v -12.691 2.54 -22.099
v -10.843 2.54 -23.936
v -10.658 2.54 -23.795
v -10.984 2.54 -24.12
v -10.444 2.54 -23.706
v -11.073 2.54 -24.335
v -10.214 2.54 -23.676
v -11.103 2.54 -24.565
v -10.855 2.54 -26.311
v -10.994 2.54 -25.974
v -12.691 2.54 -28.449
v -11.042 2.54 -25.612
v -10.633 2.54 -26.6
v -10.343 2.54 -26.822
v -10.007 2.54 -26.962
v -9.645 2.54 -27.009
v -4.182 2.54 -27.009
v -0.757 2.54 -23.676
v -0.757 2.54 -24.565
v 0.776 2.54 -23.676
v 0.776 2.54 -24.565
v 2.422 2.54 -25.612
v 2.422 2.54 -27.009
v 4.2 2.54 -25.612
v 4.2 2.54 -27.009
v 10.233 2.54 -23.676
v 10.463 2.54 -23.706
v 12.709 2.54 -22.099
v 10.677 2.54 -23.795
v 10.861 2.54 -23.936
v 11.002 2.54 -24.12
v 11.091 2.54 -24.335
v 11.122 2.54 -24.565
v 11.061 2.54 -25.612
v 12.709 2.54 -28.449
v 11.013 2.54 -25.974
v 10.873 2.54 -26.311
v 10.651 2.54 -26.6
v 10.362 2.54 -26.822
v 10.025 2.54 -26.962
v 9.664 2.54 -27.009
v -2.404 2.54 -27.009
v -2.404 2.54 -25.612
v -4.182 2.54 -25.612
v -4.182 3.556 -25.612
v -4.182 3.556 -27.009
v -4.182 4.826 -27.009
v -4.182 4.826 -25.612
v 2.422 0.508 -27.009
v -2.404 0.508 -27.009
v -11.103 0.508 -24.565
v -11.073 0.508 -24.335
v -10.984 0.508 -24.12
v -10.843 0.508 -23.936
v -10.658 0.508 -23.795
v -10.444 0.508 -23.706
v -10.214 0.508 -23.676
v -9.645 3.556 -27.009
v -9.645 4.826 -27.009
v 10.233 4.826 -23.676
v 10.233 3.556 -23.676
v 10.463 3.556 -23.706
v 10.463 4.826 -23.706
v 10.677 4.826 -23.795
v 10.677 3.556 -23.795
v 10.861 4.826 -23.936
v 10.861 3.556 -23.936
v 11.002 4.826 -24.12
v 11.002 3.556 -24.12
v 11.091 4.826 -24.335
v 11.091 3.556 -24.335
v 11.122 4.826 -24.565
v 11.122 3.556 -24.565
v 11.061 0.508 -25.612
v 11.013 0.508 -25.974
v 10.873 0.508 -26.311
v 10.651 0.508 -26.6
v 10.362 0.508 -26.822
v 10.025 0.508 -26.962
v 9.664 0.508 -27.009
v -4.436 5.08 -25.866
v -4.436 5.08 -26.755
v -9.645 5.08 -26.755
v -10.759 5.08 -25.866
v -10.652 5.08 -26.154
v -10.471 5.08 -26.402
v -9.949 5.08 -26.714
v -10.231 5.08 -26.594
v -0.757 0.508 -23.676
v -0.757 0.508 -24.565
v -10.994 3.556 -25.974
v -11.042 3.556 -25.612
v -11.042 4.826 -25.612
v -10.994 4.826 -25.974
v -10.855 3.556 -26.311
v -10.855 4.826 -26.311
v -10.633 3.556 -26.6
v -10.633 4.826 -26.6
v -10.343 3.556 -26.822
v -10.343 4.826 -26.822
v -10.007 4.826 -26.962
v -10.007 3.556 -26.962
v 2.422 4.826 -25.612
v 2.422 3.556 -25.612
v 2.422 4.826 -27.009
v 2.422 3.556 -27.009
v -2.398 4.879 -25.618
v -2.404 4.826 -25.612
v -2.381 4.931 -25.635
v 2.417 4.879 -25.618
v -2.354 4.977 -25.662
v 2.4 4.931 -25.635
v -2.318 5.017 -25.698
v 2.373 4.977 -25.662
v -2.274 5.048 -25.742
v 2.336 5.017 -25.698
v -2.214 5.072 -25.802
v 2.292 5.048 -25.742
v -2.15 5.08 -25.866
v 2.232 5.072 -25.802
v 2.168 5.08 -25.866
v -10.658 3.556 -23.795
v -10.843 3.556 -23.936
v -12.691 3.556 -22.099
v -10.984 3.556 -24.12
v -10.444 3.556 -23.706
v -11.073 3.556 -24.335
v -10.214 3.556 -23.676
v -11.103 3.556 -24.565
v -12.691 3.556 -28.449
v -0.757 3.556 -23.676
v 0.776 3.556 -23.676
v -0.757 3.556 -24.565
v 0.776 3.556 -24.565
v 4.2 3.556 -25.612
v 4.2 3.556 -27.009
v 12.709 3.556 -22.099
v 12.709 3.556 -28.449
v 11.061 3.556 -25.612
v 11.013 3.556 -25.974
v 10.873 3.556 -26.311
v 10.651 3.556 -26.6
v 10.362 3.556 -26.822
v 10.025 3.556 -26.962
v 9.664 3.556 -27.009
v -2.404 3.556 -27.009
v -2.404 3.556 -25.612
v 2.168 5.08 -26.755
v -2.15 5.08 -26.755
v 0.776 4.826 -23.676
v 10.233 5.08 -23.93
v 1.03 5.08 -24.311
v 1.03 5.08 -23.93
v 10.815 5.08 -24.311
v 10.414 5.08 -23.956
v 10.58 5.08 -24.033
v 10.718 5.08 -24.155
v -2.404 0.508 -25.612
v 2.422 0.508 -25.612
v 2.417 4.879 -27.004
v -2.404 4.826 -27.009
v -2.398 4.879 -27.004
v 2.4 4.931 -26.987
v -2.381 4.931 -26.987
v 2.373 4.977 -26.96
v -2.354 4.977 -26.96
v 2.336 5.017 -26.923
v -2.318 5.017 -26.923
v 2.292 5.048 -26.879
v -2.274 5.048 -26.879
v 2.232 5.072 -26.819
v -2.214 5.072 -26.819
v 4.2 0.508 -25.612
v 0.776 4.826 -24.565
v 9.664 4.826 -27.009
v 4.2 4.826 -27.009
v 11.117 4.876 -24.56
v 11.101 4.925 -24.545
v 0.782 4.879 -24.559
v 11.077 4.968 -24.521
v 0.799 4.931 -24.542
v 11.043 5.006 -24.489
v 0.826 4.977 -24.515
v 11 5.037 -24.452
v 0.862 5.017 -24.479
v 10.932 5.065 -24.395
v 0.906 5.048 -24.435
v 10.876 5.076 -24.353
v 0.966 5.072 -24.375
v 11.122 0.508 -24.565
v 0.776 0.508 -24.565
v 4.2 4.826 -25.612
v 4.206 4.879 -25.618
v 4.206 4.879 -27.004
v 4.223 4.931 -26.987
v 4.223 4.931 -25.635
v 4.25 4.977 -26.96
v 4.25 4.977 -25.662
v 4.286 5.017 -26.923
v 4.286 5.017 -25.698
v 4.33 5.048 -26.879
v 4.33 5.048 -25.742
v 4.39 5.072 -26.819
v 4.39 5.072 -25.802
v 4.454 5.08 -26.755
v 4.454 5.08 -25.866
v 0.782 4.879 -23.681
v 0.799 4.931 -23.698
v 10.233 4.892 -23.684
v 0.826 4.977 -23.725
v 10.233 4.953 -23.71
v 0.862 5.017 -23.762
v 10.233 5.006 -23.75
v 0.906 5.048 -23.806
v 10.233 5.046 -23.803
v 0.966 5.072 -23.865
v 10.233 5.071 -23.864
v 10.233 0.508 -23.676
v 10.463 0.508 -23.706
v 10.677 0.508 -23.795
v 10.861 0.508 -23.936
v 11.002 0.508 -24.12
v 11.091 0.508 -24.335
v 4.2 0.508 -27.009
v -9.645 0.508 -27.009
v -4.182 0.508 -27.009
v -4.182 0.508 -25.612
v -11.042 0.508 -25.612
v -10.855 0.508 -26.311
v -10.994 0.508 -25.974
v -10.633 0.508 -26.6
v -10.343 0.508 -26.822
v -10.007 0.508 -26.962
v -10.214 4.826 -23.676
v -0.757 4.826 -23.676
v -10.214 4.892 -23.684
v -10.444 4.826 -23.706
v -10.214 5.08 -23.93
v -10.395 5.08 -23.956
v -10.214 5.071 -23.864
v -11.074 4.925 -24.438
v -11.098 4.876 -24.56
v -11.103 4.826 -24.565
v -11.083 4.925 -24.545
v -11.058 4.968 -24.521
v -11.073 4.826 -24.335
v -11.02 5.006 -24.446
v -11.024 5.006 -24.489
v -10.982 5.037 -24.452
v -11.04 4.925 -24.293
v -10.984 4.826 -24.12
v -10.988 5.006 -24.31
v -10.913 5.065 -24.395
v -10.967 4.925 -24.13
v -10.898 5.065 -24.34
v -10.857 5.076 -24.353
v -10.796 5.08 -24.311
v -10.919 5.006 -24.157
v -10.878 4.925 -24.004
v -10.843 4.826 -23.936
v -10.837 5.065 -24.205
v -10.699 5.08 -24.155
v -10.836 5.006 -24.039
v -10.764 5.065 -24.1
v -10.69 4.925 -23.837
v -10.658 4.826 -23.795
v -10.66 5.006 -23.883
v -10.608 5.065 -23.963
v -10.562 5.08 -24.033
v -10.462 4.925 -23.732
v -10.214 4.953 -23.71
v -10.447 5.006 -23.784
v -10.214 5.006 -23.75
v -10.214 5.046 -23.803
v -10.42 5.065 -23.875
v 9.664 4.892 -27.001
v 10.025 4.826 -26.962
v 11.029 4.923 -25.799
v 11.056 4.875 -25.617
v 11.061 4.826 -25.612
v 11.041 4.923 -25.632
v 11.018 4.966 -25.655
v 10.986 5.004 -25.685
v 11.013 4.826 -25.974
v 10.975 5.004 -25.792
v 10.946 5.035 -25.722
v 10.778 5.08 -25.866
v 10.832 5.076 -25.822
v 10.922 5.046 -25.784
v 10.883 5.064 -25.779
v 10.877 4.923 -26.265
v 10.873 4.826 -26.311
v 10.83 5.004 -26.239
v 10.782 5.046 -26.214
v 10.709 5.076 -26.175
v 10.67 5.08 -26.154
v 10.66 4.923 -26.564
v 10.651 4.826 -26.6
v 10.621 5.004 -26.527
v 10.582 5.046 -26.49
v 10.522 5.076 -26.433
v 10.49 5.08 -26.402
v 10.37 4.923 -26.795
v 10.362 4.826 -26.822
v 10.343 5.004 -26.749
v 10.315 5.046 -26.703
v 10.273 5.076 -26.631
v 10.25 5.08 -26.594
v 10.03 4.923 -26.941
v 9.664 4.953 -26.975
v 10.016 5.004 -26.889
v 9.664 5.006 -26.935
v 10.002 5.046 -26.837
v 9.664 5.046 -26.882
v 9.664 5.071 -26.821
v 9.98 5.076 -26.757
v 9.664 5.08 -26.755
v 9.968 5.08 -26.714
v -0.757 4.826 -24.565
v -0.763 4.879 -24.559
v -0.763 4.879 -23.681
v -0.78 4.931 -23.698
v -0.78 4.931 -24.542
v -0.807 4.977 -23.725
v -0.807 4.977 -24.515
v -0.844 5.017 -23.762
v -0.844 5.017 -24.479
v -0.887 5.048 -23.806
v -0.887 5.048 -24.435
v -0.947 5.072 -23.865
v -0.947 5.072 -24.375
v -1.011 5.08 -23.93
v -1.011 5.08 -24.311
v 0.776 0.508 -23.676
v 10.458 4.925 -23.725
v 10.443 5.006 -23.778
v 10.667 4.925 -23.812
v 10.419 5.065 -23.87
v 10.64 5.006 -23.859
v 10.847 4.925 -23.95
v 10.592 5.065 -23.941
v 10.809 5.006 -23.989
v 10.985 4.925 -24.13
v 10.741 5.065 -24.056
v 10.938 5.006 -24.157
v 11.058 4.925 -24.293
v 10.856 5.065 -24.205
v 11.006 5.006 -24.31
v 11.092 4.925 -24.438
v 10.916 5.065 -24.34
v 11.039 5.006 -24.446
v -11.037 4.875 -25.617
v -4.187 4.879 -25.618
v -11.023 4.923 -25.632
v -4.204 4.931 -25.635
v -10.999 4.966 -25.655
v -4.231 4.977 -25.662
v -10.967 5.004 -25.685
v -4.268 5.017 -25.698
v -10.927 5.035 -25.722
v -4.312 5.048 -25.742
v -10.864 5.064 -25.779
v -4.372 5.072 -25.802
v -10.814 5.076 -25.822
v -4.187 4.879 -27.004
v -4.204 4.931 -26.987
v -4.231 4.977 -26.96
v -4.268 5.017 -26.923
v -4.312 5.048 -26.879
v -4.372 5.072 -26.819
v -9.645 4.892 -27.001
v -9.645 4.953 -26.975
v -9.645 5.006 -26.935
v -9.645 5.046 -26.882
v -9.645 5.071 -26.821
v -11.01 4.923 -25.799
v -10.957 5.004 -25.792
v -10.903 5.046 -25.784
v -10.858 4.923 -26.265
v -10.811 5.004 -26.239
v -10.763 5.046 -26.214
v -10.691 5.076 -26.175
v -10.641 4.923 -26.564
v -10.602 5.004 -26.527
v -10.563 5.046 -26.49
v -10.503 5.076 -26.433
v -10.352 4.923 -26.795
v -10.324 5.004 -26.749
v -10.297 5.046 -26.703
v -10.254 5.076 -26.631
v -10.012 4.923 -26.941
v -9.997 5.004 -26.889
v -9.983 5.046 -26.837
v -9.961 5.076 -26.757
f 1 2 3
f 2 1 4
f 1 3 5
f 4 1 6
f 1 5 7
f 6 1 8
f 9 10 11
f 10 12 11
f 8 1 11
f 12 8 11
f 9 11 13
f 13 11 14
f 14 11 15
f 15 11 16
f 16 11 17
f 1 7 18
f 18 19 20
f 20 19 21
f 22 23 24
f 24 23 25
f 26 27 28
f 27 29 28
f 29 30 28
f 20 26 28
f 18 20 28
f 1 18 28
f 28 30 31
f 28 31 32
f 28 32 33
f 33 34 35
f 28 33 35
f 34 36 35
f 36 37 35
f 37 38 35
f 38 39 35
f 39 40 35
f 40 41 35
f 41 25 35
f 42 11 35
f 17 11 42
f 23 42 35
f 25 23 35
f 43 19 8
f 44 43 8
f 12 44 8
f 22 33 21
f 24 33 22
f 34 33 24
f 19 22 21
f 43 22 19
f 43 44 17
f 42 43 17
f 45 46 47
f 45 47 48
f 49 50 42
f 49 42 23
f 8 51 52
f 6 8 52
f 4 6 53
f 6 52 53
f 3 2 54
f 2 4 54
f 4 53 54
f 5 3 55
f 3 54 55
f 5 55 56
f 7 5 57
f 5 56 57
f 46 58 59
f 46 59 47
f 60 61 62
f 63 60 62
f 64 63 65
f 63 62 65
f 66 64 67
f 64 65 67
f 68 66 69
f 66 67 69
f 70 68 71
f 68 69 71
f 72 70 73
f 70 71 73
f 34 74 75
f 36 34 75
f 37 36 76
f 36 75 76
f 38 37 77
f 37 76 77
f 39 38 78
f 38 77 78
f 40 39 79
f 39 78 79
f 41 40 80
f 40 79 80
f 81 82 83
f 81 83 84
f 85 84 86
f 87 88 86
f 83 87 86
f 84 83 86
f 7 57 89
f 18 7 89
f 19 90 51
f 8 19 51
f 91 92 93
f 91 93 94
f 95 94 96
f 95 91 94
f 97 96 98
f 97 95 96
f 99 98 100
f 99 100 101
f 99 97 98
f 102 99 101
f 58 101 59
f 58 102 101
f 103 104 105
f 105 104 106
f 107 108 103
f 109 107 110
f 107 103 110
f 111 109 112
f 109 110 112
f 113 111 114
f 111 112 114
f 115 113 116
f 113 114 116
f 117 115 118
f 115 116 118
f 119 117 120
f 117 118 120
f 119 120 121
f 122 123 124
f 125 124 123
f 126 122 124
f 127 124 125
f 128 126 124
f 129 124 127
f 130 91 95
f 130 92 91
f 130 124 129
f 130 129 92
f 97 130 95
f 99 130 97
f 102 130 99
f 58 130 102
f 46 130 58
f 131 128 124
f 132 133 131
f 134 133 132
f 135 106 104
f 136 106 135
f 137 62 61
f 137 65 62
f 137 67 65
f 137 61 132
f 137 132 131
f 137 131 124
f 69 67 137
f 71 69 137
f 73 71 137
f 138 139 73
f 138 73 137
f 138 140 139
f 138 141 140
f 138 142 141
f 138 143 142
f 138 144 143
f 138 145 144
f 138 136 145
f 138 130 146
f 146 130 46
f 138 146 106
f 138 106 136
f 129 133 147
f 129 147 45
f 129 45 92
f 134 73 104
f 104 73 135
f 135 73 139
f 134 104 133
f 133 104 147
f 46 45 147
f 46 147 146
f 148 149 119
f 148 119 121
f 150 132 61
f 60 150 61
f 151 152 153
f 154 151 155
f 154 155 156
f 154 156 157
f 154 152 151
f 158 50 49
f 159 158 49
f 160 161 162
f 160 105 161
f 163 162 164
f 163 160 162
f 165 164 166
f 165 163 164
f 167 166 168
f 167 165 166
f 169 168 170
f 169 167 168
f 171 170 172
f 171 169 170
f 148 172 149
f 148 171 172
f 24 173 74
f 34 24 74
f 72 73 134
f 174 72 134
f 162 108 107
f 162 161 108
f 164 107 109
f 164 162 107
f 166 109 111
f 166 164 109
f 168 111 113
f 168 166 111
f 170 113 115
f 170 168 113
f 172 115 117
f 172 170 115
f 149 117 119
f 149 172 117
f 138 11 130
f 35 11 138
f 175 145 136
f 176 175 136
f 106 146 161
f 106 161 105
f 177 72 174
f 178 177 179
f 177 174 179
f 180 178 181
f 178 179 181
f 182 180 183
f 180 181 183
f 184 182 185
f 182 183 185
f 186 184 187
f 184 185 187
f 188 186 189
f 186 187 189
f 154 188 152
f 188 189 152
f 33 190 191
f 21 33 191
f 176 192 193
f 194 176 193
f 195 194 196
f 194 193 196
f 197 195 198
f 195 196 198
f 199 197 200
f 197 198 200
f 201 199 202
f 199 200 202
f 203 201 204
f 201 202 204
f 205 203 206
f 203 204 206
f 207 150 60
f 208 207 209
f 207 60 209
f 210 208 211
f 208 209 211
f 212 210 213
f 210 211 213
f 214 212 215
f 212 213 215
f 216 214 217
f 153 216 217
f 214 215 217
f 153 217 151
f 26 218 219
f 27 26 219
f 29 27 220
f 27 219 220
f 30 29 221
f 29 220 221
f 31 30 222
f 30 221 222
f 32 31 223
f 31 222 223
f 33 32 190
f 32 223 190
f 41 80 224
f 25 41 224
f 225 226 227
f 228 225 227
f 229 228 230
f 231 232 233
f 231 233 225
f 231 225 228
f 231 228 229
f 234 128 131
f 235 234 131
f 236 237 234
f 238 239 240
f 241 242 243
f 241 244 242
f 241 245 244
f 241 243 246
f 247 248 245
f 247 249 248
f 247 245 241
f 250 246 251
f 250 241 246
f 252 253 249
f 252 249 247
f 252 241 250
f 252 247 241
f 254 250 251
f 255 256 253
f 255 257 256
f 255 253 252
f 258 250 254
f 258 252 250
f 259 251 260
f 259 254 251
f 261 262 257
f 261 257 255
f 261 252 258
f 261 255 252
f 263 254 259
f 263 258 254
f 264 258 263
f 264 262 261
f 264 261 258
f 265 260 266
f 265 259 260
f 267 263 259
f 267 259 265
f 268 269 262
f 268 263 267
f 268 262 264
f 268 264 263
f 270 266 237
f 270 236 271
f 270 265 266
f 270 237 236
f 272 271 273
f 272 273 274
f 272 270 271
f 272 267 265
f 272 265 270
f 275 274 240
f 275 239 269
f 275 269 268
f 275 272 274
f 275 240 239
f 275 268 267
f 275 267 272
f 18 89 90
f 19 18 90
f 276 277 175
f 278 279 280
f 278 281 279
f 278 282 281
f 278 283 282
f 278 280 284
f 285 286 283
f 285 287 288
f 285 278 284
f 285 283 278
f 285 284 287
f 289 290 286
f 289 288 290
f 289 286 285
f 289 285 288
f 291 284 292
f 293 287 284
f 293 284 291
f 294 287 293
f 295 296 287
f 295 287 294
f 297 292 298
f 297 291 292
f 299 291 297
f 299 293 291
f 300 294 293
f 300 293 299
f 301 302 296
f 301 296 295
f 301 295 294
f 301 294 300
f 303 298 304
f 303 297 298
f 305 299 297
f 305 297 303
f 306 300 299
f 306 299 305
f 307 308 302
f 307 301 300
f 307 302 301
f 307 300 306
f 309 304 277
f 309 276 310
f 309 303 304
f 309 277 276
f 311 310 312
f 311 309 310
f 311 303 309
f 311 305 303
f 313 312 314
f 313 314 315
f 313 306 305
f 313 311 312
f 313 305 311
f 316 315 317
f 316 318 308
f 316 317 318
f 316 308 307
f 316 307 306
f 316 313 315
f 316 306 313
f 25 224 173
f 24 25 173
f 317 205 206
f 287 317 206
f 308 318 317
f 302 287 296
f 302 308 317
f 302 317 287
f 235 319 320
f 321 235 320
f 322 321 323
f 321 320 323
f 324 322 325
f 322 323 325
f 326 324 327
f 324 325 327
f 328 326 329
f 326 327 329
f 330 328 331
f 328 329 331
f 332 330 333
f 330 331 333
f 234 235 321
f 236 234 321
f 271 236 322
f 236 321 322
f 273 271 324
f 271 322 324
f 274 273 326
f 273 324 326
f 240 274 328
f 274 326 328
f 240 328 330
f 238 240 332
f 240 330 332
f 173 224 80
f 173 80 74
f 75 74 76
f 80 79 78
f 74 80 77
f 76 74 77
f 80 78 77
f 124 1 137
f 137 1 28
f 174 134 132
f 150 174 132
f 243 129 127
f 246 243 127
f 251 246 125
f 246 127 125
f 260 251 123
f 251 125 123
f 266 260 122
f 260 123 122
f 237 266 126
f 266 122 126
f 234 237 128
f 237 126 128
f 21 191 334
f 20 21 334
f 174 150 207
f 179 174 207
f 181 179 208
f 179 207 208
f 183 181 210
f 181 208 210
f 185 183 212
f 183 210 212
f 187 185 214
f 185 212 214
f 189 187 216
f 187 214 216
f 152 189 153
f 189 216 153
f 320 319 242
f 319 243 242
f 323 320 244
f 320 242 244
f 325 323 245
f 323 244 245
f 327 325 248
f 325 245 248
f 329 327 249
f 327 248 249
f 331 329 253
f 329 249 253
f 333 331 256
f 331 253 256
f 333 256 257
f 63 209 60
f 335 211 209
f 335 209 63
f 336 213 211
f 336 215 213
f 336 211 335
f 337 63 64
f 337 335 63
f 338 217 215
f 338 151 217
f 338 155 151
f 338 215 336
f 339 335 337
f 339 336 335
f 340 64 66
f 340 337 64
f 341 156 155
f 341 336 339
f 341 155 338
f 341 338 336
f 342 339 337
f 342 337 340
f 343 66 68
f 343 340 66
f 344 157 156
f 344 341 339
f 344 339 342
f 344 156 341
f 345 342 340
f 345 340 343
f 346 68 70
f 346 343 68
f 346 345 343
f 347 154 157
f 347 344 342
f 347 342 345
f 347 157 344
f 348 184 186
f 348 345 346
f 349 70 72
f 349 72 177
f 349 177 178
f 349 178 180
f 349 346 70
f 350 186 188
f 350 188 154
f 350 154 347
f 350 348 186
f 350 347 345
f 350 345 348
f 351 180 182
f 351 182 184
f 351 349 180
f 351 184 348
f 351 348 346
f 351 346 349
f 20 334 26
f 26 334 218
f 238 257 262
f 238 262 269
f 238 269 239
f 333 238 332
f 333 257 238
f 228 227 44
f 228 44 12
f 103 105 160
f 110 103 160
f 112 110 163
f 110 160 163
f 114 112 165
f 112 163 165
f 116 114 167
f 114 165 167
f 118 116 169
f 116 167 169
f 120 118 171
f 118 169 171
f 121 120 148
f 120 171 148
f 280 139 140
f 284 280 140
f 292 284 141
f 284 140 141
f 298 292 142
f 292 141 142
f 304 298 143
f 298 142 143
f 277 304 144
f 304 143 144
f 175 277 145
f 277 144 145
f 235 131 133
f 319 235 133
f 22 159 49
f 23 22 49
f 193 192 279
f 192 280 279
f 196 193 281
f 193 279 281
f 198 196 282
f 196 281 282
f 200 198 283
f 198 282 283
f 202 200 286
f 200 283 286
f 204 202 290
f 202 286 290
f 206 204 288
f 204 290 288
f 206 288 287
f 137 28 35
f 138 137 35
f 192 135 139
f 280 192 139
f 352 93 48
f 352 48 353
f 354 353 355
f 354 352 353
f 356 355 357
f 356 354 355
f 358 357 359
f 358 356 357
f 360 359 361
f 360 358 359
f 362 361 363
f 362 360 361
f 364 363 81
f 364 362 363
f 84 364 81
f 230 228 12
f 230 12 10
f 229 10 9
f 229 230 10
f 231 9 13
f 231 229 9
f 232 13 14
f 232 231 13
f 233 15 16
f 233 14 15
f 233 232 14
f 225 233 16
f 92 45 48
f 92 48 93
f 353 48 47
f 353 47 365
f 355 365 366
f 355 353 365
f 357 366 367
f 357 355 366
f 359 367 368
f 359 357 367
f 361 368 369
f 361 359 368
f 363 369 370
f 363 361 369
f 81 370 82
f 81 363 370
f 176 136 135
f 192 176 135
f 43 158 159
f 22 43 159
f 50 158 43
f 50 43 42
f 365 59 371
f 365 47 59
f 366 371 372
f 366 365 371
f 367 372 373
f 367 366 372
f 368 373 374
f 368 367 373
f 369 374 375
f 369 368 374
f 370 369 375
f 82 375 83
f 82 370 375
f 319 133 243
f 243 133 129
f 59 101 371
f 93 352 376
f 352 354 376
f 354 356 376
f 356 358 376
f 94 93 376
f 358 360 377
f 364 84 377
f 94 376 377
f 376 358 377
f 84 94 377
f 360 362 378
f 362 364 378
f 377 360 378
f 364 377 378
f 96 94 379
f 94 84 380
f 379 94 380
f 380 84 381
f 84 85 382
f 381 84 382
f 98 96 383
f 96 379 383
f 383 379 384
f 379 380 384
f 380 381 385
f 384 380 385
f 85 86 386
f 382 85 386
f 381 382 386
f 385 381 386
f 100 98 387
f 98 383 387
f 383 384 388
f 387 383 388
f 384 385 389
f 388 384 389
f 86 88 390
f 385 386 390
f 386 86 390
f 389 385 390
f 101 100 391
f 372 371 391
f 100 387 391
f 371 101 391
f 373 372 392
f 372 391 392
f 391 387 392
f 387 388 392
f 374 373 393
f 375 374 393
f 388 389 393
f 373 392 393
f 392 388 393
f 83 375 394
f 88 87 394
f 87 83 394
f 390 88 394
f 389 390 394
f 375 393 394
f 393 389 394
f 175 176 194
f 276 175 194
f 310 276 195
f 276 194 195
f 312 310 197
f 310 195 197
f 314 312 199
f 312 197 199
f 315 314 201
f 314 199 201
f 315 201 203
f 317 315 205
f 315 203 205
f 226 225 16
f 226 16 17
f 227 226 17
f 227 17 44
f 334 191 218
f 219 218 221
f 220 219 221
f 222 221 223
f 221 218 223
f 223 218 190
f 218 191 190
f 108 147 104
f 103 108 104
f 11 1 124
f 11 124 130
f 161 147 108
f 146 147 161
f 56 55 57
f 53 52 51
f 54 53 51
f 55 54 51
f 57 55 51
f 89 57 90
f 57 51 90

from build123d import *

# Parameters (mm, degrees)
BOSS_EXTRUDE1_DEPTH        = 2.032
BOSS_EXTRUDE1_DEPTH_BACK   = 2.54
BOSS_EXTRUDE1_2_DEPTH      = 2.032
BOSS_EXTRUDE1_2_DEPTH_BACK = 2.54
BOSS_EXTRUDE1_3_DEPTH      = 2.032
BOSS_EXTRUDE1_3_DEPTH_BACK = 2.54
SKETCH1_W                  = 4.826
SKETCH1_H                  = 1.397
BOSS_EXTRUDE1_4_DEPTH      = 2.032
BOSS_EXTRUDE1_4_DEPTH_BACK = 2.54
BOSS_EXTRUDE1_5_DEPTH      = 2.032
BOSS_EXTRUDE1_5_DEPTH_BACK = 2.54
BOSS_EXTRUDE2_DEPTH        = 0.508
BOSS_EXTRUDE2_DEPTH_BACK   = 0.508
SKETCH1_3_W                = 25.4
SKETCH1_3_H                = 6.35
SKETCH1_3_W_2              = 4.826
SKETCH1_3_H_2              = 1.397
FILLET1_R                  = 0.254


with BuildPart() as part:
    # Sketch1 → Boss-Extrude1 (new, two sides: drawn at the far end of the back side and taken through both)
    with BuildSketch(Plane(origin=(0, 3.048, 0), x_dir=(1, 0, 0), z_dir=(0, 1, 0)).offset(-BOSS_EXTRUDE1_DEPTH_BACK)):
        with BuildLine():
            Line((-4.181695904, 27.009366894), (-9.644992793, 27.009366894))
            ThreePointArc((-9.644992793, 27.009366894), (-10.632820966, 26.600195068), (-11.041992793, 25.612366894))
            Line((-11.041992793, 25.612366894), (-4.181695904, 25.612366894))
            Line((-4.181695904, 25.612366894), (-4.181695904, 27.009366894))
        make_face()
    extrude(amount=BOSS_EXTRUDE1_DEPTH + BOSS_EXTRUDE1_DEPTH_BACK)



with BuildPart() as body_2:
    # Sketch1 → Boss-Extrude1 2 (new, two sides: drawn at the far end of the back side and taken through both)
    with BuildSketch(Plane(origin=(0, 3.048, 0), x_dir=(1, 0, 0), z_dir=(0, 1, 0)).offset(-BOSS_EXTRUDE1_2_DEPTH_BACK)):
        with BuildLine():
            Line((0.776095842, 24.564616894), (0.776095842, 23.675616894))
            Line((0.776095842, 23.675616894), (10.23259664, 23.675616894))
            ThreePointArc((10.23259664, 23.675616894), (10.861214569, 23.935998966), (11.12159664, 24.564616894))
            Line((11.12159664, 24.564616894), (0.776095842, 24.564616894))
        make_face()
    extrude(amount=BOSS_EXTRUDE1_2_DEPTH + BOSS_EXTRUDE1_2_DEPTH_BACK)


with BuildPart() as body_3:
    # Sketch1 → Boss-Extrude1 3 (new, two sides: drawn at the far end of the back side and taken through both)
    with BuildSketch(Plane(origin=(0, 3.048, 0), x_dir=(1, 0, 0), z_dir=(0, 1, 0)).offset(-BOSS_EXTRUDE1_3_DEPTH_BACK)):
        with Locations((0.009304096, 26.310866894)):
            Rectangle(SKETCH1_W, SKETCH1_H)
    extrude(amount=BOSS_EXTRUDE1_3_DEPTH + BOSS_EXTRUDE1_3_DEPTH_BACK)


with BuildPart() as body_4:
    # Sketch1 → Boss-Extrude1 4 (new, two sides: drawn at the far end of the back side and taken through both)
    with BuildSketch(Plane(origin=(0, 3.048, 0), x_dir=(1, 0, 0), z_dir=(0, 1, 0)).offset(-BOSS_EXTRUDE1_4_DEPTH_BACK)):
        with BuildLine():
            Line((9.663600985, 27.009366894), (4.200304096, 27.009366894))
            Line((4.200304096, 27.009366894), (4.200304096, 25.612366894))
            Line((4.200304096, 25.612366894), (11.060600985, 25.612366894))
            ThreePointArc((11.060600985, 25.612366894), (10.651429158, 26.600195068), (9.663600985, 27.009366894))
        make_face()
    extrude(amount=BOSS_EXTRUDE1_4_DEPTH + BOSS_EXTRUDE1_4_DEPTH_BACK)


with BuildPart() as body_5:
    # Sketch1 → Boss-Extrude1 5 (new, two sides: drawn at the far end of the back side and taken through both)
    with BuildSketch(Plane(origin=(0, 3.048, 0), x_dir=(1, 0, 0), z_dir=(0, 1, 0)).offset(-BOSS_EXTRUDE1_5_DEPTH_BACK)):
        with BuildLine():
            Line((-0.75748765, 23.675616894), (-0.75748765, 24.564616894))
            Line((-0.75748765, 24.564616894), (-11.102988449, 24.564616894))
            ThreePointArc((-11.102988449, 24.564616894), (-10.842606377, 23.935998966), (-10.213988449, 23.675616894))
            Line((-10.213988449, 23.675616894), (-0.75748765, 23.675616894))
        make_face()
    extrude(amount=BOSS_EXTRUDE1_5_DEPTH + BOSS_EXTRUDE1_5_DEPTH_BACK)


with BuildPart() as part_1:
    add(part.part)

    add(body_2.part)  # Boss-Extrude2 merges body 2

    add(body_3.part)  # Boss-Extrude2 merges body 3

    add(body_4.part)  # Boss-Extrude2 merges body 4

    add(body_5.part)  # Boss-Extrude2 merges body 5
    # Sketch1<3> → Boss-Extrude2 (add, two sides: drawn at the far end of the back side and taken through both)
    with BuildSketch(Plane(origin=(0, 3.048, 0), x_dir=(1, 0, 0), z_dir=(0, 1, 0)).offset(-BOSS_EXTRUDE2_DEPTH_BACK)):
        with Locations((0.009304096, 25.273558827)):
            Rectangle(SKETCH1_3_W, SKETCH1_3_H)
        with BuildLine():
            Line((-11.102988449, 24.564616894), (-0.75748765, 24.564616894))
            Line((-0.75748765, 24.564616894), (-0.75748765, 23.675616894))
            Line((-0.75748765, 23.675616894), (-10.213988449, 23.675616894))
            ThreePointArc((-10.213988449, 23.675616894), (-10.842606377, 23.935998966), (-11.102988449, 24.564616894))
        make_face(mode=Mode.SUBTRACT)
        with BuildLine():
            Line((10.23259664, 23.675616894), (0.776095842, 23.675616894))
            Line((0.776095842, 23.675616894), (0.776095842, 24.564616894))
            Line((0.776095842, 24.564616894), (11.12159664, 24.564616894))
            ThreePointArc((11.12159664, 24.564616894), (10.861214569, 23.935998966), (10.23259664, 23.675616894))
        make_face(mode=Mode.SUBTRACT)
        with BuildLine():
            ThreePointArc((-11.041992793, 25.612366894), (-10.632820966, 26.600195068), (-9.644992793, 27.009366894))
            Line((-9.644992793, 27.009366894), (-4.181695904, 27.009366894))
            Line((-4.181695904, 27.009366894), (-4.181695904, 25.612366894))
            Line((-4.181695904, 25.612366894), (-11.041992793, 25.612366894))
        make_face(mode=Mode.SUBTRACT)
        with Locations((0.009304096, 26.310866894)):
            Rectangle(SKETCH1_3_W_2, SKETCH1_3_H_2, mode=Mode.SUBTRACT)
        with BuildLine():
            Line((4.200304096, 25.612366894), (4.200304096, 27.009366894))
            Line((4.200304096, 27.009366894), (9.663600985, 27.009366894))
            ThreePointArc((9.663600985, 27.009366894), (10.651429158, 26.600195068), (11.060600985, 25.612366894))
            Line((11.060600985, 25.612366894), (4.200304096, 25.612366894))
        make_face(mode=Mode.SUBTRACT)
    extrude(amount=BOSS_EXTRUDE2_DEPTH + BOSS_EXTRUDE2_DEPTH_BACK)

    # Fillet1
    fillet1_edges = [part_1.edges().sort_by_distance(p)[0] for p in [
        (0.009304096, 5.08, -25.612366894),
        (-2.403695904, 5.08, -26.310866894),
        (0.009304096, 5.08, -27.009366894),
        (2.422304096, 5.08, -26.310866894),
        (-7.611844348, 5.08, -25.612366894),
        (-10.632820966, 5.08, -26.600195068),
        (-6.913344348, 5.08, -27.009366894),
        (-4.181695904, 5.08, -26.310866894),
        (-5.485738049, 5.08, -23.675616894),
        (-10.842606377, 5.08, -23.935998966),
        (-5.930238049, 5.08, -24.564616894),
        (-0.75748765, 5.08, -24.120116894),
        (5.948846241, 5.08, -24.564616894),
        (10.861214569, 5.08, -23.935998966),
        (5.504346241, 5.08, -23.675616894),
        (0.776095842, 5.08, -24.120116894),
        (4.200304096, 5.08, -26.310866894),
        (6.93195254, 5.08, -27.009366894),
        (10.651429158, 5.08, -26.600195068),
        (7.63045254, 5.08, -25.612366894),
    ]]
    fillet(fillet1_edges, radius=FILLET1_R)


solid = part_1.part
